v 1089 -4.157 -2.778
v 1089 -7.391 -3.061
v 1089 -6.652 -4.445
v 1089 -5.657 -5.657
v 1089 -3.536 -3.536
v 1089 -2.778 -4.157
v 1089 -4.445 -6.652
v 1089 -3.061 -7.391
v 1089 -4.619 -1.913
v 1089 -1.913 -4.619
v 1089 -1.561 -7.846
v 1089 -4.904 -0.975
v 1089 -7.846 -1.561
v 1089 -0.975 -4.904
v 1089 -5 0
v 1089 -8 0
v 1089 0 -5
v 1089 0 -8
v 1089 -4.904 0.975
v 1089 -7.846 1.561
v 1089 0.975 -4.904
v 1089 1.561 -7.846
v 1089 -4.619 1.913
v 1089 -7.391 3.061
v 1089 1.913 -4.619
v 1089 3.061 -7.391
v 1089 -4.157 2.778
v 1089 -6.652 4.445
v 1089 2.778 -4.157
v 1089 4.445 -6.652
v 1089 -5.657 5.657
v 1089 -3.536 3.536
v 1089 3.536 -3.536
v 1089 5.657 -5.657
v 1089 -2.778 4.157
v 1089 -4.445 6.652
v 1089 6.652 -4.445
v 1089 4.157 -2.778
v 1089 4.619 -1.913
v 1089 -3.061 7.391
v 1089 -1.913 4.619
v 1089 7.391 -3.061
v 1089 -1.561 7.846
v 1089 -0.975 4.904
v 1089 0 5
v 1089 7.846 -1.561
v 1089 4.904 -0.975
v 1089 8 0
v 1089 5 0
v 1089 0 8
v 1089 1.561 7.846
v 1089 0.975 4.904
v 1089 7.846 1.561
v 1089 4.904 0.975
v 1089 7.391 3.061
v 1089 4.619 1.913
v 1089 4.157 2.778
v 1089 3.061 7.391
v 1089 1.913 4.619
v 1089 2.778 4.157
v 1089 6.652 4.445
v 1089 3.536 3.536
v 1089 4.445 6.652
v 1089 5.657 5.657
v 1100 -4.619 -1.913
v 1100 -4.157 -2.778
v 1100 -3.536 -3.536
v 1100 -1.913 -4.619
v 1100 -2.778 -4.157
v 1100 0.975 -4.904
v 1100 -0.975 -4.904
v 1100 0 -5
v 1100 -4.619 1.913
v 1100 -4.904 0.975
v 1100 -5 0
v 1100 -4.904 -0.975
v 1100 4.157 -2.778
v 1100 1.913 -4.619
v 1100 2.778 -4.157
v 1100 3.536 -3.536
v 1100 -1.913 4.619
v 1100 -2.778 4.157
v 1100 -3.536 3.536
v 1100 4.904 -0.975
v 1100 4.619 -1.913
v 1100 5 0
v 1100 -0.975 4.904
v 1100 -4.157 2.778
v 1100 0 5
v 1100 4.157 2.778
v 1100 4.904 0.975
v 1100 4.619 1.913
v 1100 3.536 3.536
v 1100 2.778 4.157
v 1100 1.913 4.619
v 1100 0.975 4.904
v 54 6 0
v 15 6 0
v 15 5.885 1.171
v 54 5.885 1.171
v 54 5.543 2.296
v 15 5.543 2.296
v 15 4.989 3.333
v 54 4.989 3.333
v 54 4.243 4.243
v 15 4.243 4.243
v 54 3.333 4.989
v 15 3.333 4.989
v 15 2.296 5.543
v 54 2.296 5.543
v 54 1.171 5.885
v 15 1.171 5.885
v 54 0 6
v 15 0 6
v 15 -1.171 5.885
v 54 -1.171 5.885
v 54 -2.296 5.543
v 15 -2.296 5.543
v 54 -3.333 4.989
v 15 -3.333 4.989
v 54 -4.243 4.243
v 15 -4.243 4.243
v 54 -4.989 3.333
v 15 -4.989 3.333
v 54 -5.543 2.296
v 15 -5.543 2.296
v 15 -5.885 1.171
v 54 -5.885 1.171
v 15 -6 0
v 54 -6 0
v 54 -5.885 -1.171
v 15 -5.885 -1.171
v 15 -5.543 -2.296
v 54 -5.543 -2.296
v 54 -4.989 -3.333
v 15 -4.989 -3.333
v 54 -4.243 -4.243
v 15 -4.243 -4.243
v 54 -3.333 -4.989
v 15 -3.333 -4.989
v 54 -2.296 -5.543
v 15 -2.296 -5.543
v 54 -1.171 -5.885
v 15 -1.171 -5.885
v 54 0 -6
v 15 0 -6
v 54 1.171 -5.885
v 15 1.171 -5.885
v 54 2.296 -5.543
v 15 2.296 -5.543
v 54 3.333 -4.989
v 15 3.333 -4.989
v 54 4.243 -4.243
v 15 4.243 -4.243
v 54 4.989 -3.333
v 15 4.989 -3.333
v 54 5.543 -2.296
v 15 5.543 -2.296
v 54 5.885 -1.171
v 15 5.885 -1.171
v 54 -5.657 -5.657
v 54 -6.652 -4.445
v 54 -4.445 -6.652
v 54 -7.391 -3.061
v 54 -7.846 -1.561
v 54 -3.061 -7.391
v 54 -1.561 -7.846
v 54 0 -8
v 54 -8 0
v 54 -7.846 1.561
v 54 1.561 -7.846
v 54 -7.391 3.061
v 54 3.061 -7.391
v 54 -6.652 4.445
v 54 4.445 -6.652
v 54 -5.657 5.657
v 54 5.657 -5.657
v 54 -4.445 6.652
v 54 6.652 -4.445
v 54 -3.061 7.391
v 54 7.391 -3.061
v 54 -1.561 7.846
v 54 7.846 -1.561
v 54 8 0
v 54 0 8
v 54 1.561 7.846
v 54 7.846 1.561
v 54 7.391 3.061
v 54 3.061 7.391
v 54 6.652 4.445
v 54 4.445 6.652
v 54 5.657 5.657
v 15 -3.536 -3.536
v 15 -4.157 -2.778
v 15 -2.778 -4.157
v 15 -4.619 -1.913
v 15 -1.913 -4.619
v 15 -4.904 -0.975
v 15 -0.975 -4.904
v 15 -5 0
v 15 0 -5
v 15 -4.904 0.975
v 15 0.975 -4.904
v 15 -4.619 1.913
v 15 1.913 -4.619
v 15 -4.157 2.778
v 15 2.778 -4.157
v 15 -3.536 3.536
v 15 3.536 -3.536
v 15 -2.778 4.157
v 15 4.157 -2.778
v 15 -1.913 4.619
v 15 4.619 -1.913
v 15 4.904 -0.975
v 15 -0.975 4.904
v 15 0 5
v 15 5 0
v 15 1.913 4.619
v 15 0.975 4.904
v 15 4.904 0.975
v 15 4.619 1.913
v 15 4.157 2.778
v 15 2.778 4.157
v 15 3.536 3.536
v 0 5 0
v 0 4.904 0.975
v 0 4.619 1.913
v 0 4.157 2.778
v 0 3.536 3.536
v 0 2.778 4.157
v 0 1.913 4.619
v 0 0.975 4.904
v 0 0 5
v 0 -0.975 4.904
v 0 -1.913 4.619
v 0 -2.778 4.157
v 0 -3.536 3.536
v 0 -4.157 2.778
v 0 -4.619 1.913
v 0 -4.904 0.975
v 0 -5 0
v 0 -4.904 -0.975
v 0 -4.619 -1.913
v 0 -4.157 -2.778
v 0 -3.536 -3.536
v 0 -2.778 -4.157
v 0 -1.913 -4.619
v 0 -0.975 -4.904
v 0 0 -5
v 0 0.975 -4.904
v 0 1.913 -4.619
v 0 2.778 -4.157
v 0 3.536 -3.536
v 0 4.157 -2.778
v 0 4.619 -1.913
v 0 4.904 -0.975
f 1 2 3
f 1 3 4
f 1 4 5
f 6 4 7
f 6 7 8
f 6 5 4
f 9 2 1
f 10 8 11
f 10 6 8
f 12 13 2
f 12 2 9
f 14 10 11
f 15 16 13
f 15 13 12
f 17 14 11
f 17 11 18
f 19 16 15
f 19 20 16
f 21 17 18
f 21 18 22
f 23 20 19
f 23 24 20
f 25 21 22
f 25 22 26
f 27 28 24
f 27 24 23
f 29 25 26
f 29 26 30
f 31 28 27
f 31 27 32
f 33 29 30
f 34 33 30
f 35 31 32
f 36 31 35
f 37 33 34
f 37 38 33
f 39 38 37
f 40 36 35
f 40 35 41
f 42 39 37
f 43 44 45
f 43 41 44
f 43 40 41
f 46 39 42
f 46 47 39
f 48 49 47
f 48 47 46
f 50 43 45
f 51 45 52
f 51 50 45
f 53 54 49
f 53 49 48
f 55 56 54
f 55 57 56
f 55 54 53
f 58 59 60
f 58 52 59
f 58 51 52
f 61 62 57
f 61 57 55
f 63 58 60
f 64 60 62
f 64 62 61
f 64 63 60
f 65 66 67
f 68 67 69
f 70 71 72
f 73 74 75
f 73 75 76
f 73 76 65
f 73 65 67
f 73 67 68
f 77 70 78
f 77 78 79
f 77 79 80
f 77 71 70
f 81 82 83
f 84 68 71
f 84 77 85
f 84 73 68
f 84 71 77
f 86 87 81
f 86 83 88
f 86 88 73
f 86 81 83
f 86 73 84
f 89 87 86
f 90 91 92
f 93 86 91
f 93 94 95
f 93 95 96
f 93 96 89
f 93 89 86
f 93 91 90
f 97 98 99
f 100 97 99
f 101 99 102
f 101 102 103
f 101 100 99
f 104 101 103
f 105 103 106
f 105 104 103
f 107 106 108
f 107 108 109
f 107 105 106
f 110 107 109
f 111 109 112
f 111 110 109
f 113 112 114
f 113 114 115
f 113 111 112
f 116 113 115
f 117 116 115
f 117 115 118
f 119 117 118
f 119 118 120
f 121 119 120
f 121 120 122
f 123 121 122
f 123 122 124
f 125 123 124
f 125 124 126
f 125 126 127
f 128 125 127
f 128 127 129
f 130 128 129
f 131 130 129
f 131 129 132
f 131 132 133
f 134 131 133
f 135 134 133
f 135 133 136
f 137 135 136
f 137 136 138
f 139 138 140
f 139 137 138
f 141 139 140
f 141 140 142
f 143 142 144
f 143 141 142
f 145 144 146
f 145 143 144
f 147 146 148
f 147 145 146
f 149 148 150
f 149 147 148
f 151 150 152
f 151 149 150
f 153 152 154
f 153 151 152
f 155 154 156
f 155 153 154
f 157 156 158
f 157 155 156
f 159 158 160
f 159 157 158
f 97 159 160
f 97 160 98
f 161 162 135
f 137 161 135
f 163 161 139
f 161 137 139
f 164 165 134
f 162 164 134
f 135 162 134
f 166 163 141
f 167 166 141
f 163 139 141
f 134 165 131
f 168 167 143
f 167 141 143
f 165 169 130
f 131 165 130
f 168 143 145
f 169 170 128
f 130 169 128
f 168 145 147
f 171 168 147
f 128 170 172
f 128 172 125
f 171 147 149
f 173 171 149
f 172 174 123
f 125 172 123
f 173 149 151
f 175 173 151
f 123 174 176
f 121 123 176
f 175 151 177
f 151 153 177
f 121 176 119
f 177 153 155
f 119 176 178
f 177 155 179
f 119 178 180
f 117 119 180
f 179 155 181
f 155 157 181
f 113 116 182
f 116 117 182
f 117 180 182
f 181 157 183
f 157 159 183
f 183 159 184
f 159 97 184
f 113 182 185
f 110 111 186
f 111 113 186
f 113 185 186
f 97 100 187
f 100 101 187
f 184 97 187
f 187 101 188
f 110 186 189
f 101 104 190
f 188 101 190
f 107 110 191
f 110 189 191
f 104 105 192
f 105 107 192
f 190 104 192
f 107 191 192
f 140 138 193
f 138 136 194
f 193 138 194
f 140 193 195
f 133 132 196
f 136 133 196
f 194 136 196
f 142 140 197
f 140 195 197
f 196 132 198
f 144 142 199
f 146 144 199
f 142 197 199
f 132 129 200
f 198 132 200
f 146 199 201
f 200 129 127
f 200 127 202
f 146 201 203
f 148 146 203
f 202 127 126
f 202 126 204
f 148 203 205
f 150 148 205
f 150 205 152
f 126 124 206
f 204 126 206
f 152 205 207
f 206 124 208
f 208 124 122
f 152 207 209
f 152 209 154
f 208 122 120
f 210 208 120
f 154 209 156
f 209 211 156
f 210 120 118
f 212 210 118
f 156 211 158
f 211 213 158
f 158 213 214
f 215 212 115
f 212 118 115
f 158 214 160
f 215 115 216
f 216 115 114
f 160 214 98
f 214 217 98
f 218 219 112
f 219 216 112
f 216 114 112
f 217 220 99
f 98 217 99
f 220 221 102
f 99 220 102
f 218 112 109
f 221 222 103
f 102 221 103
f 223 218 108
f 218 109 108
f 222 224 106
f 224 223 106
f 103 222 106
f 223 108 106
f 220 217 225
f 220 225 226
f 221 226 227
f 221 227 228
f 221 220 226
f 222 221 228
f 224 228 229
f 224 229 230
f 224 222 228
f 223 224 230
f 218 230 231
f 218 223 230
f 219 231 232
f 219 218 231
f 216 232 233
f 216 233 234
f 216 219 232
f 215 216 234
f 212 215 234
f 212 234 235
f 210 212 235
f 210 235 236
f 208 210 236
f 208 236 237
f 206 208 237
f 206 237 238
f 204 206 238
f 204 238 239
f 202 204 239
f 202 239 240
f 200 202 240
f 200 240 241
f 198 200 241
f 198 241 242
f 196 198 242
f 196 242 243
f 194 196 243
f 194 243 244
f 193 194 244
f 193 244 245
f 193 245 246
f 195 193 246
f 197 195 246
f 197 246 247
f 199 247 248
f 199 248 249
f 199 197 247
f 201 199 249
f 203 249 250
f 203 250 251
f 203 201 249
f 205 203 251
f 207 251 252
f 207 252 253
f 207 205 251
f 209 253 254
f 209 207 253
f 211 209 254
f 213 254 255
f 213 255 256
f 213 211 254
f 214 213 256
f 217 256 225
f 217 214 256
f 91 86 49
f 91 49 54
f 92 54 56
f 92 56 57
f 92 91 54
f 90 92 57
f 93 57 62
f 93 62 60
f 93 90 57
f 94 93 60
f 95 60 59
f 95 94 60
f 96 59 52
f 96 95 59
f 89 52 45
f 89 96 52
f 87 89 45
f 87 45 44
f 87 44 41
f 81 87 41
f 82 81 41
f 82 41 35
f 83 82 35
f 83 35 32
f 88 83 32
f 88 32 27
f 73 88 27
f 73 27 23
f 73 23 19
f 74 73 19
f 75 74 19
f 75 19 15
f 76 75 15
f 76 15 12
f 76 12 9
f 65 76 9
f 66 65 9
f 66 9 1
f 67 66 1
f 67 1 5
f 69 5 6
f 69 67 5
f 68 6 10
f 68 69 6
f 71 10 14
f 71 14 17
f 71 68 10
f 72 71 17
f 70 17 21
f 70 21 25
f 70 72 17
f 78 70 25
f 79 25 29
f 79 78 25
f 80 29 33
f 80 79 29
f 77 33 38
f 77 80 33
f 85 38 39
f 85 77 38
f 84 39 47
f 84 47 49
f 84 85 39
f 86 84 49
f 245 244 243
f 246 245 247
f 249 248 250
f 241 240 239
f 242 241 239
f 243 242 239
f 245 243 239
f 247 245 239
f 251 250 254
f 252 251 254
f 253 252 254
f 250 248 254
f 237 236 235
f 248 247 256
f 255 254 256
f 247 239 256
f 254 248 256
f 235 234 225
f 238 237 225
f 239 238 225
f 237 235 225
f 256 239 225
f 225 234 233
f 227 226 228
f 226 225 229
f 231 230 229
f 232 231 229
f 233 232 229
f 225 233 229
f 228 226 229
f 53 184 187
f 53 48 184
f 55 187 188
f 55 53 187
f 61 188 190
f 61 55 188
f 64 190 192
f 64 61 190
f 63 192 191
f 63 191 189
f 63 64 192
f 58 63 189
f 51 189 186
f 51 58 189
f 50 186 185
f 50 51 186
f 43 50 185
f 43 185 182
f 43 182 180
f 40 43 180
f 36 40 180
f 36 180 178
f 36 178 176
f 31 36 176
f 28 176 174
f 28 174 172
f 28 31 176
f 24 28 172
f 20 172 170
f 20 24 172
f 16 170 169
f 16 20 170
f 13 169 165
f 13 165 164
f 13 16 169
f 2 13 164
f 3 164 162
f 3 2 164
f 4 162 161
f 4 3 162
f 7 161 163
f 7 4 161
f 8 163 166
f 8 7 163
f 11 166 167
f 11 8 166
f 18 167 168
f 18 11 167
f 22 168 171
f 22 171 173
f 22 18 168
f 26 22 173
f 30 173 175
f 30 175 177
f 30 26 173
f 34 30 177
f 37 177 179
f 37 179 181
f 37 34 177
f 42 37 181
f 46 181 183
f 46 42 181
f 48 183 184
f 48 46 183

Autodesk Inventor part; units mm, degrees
ref_plane "YZ Plane" through (0, 0, 0) normal (1, 0, 0) x (0, 1, 0)
ref_plane "XZ Plane" through (0, 0, 0) normal (0, 1, 0) x (-1, 0, 0)
ref_plane "XY Plane" through (0, 0, 0) normal (0, 0, 1) x (1, 0, 0)
sketch "Sketch1" plane through (0, 0, 0) normal (0, 0, 1) x (1, 0, 0)
  line L0 (0, 0) -> (0, 5)
  line L1 (0, 5) -> (15, 5)
  line L2 (15, 5) -> (15, 6)
  line L3 (15, 6) -> (54, 6)
  line L4 (54, 6) -> (54, 8)
  line L5 (54, 8) -> (1089, 8)
  line L6 (1089, 8) -> (1089, 5)
  line L7 (1089, 5) -> (1100, 5)
  line L8 (1100, 5) -> (1100, 0)
  line L9 (1100, 0) -> (0, 0)
  line L10 (0, 0) -> (1100, 0)
  dimension "d0" = 5
  dimension "d1" = 6
  dimension "d2" = 8
  dimension "d3" = 5
  dimension "d4" = 11
  dimension "d6" = 39
  dimension "d8" = 15
  dimension "d9" = 1100
revolve "Revolution1" add sketch "Sketch1" angle 360 about axis through (0, 0, 0) along (1, 0, 0)
properties part number "SFU1605"
